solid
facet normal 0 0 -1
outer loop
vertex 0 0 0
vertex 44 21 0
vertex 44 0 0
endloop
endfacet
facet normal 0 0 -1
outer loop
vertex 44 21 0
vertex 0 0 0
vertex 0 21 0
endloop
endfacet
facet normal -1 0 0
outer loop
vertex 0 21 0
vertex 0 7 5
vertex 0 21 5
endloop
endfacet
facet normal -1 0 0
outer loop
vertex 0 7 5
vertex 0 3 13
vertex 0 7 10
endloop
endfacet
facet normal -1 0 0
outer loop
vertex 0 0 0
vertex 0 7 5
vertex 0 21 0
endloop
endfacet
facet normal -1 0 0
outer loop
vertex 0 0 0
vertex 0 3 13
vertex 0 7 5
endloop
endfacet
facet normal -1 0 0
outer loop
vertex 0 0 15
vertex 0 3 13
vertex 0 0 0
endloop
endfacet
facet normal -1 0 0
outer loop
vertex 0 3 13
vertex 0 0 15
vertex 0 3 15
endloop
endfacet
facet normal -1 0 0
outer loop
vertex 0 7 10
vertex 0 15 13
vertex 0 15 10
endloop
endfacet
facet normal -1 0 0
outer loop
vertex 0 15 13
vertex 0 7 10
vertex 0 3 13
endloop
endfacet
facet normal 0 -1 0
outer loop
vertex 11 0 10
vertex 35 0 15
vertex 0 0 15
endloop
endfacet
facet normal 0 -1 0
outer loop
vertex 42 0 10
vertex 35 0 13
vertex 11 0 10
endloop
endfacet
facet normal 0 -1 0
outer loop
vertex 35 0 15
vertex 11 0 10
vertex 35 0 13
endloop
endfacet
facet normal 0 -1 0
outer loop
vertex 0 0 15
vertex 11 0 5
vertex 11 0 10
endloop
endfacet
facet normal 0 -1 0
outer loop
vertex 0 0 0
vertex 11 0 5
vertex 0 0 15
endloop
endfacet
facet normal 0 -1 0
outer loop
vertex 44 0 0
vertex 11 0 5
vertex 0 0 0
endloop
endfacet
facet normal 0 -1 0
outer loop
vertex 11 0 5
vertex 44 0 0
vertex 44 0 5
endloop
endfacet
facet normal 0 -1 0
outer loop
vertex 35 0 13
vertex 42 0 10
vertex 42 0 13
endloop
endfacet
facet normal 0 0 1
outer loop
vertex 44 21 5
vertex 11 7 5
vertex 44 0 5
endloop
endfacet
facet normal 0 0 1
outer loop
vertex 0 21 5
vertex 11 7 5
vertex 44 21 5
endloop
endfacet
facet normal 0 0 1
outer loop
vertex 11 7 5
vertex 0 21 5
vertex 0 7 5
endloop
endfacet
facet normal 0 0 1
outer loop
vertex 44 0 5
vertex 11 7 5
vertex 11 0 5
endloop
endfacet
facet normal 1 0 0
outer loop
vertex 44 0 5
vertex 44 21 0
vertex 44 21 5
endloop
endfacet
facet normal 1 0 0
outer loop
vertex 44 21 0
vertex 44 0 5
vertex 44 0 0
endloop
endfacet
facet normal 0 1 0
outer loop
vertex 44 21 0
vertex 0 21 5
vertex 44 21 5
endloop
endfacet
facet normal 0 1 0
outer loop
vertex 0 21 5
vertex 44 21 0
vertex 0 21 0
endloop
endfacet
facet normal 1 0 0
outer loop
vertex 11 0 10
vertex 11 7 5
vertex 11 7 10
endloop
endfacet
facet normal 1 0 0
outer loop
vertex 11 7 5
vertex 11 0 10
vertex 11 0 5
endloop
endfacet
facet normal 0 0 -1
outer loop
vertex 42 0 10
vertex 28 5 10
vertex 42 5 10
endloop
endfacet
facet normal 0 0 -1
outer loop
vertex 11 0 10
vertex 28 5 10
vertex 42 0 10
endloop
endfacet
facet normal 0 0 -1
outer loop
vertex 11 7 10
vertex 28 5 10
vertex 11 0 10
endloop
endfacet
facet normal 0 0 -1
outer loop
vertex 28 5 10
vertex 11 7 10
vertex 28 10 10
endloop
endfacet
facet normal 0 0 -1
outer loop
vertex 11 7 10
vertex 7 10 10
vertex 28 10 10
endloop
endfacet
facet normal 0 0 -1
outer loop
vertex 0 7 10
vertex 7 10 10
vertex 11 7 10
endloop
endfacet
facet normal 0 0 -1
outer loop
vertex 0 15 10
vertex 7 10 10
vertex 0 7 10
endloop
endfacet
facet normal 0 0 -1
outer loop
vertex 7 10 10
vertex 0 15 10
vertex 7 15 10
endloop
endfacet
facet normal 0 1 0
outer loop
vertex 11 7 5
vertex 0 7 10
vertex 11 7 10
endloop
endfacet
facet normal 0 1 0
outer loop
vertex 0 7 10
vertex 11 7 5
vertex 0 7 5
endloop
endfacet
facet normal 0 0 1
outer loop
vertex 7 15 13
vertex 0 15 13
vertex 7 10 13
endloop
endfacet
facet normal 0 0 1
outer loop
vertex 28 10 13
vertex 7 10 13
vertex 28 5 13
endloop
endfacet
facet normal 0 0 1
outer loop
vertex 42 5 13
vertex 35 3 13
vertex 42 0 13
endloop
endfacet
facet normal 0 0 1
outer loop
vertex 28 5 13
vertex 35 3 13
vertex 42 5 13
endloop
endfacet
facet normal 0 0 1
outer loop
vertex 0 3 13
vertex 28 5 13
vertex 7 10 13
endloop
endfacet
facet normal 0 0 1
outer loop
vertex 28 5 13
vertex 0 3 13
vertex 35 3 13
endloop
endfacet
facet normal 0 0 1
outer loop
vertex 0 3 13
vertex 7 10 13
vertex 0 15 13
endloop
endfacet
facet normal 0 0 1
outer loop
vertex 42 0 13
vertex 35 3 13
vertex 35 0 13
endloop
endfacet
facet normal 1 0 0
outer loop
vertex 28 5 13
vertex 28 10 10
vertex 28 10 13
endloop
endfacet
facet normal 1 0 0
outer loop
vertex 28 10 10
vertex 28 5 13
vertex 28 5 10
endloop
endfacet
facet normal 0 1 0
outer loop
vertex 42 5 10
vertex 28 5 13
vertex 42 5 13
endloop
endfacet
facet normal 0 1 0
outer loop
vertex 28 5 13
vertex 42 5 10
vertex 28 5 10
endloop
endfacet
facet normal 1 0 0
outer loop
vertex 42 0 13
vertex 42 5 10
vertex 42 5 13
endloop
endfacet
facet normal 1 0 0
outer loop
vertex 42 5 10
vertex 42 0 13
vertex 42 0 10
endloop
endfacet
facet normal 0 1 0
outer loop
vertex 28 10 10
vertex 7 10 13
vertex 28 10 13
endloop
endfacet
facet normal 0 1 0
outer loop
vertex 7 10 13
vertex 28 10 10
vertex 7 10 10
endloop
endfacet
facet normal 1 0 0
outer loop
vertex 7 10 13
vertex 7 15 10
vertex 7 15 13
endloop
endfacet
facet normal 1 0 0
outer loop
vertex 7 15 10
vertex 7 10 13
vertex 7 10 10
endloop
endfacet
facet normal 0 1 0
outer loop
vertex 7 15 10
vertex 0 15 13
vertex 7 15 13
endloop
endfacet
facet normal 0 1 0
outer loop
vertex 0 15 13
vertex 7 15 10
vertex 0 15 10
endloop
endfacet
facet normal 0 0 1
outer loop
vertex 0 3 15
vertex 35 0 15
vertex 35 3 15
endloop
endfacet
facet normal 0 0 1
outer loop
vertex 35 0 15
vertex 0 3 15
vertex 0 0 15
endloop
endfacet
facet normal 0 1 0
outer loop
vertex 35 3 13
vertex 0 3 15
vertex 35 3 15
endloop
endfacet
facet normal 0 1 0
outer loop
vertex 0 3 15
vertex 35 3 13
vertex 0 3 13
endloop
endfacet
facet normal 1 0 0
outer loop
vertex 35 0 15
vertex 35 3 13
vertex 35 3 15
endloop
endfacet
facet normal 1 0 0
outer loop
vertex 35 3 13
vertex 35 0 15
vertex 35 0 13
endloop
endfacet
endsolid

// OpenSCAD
translate([5.5, 3.5, 2.5]) color([0.060222107499701916, 0.3001851524622099, 0.7452096901500458]) cube([11, 7, 5], center=true);
translate([16.5, 3.5, 2.5]) color([0.05240587806206365, 0.6211421952822352, 0.025546799267838538]) cube([11, 7, 5], center=true);
translate([27.5, 3.5, 2.5]) color([0.4715288683099005, 0.8885450437134765, 0.010110093997603875]) cube([11, 7, 5], center=true);
translate([38.5, 3.5, 2.5]) color([0.5268280206539229, 0.06645682965886301, 0.8671097761494883]) cube([11, 7, 5], center=true);
translate([5.5, 10.5, 2.5]) color([0.6862965222396646, 0.7419538566814291, 0.669007579945888]) cube([11, 7, 5], center=true);
translate([16.5, 10.5, 2.5]) color([0.006423453698145676, 0.041177862257898545, 0.6208768040220466]) cube([11, 7, 5], center=true);
translate([27.5, 10.5, 2.5]) color([0.9996851255769114, 0.8731472390917929, 0.699685806725371]) cube([11, 7, 5], center=true);
translate([38.5, 10.5, 2.5]) color([0.7270999543422898, 0.2266870226016624, 0.751613934135812]) cube([11, 7, 5], center=true);
translate([5.5, 17.5, 2.5]) color([0.28792410486343756, 0.10546026702239297, 0.4608948954667579]) cube([11, 7, 5], center=true);
translate([16.5, 17.5, 2.5]) color([0.33019577252961807, 0.168255398651179, 0.42170989251140467]) cube([11, 7, 5], center=true);
translate([27.5, 17.5, 2.5]) color([0.8972009769638755, 0.4352702732981688, 0.4472918952497248]) cube([11, 7, 5], center=true);
translate([38.5, 17.5, 2.5]) color([0.708827757444238, 0.5241618701522923, 0.12922303534199353]) cube([11, 7, 5], center=true);
translate([5.5, 3.5, 7.5]) color([0.91039239754397, 0.4441243361619651, 0.7893377392253591]) cube([11, 7, 5], center=true);
translate([3.5, 2.5, 11.5]) color([0.38887513002224416, 0.806846018820692, 0.3895364160074527]) cube([7, 5, 3], center=true);
translate([10.5, 2.5, 11.5]) color([0.2201595216660458, 0.19619466691666865, 0.9400346443375104]) cube([7, 5, 3], center=true);
translate([17.5, 2.5, 11.5]) color([0.58653025858102, 0.04979326505826487, 0.38834759617804915]) cube([7, 5, 3], center=true);
translate([24.5, 2.5, 11.5]) color([0.234029260524927, 0.08465706460929934, 0.18675586852140846]) cube([7, 5, 3], center=true);
translate([31.5, 2.5, 11.5]) color([0.05699047999950346, 0.6380736282281027, 0.17337386483746886]) cube([7, 5, 3], center=true);
translate([38.5, 2.5, 11.5]) color([0.6107798762435255, 0.6125067478912297, 0.7049237107399368]) cube([7, 5, 3], center=true);
translate([3.5, 7.5, 11.5]) color([0.5121186506114312, 0.28442399033479826, 0.8774574539285279]) cube([7, 5, 3], center=true);
translate([10.5, 7.5, 11.5]) color([0.35307108172351365, 0.4582943249787391, 0.6318794317305464]) cube([7, 5, 3], center=true);
translate([17.5, 7.5, 11.5]) color([0.5161242981674495, 0.9564683485665337, 0.9547176774381221]) cube([7, 5, 3], center=true);
translate([24.5, 7.5, 11.5]) color([0.9297598506094263, 0.9340763496652581, 0.580960135568696]) cube([7, 5, 3], center=true);
translate([3.5, 12.5, 11.5]) color([0.49020206373000297, 0.7041168173823689, 0.21541959298546798]) cube([7, 5, 3], center=true);
translate([2.5, 1.5, 14.0]) color([0.26587203921552827, 0.04380725363309168, 0.16285754255803098]) cube([5, 3, 2], center=true);
translate([7.5, 1.5, 14.0]) color([0.0038745499388105342, 0.6546275765234981, 0.14040698903568194]) cube([5, 3, 2], center=true);
translate([12.5, 1.5, 14.0]) color([0.7866793455760521, 0.680503995881725, 0.9706757933544957]) cube([5, 3, 2], center=true);
translate([17.5, 1.5, 14.0]) color([0.3965144869518913, 0.9213919134510528, 0.4537041723195332]) cube([5, 3, 2], center=true);
translate([22.5, 1.5, 14.0]) color([0.3395037398362071, 0.10233886991705377, 0.8828321850718597]) cube([5, 3, 2], center=true);
translate([27.5, 1.5, 14.0]) color([0.7947901585625868, 0.3229289765350606, 0.45574438492562896]) cube([5, 3, 2], center=true);
translate([32.5, 1.5, 14.0]) color([0.32514346581324827, 0.028829116538094723, 0.04435252539911694]) cube([5, 3, 2], center=true);
